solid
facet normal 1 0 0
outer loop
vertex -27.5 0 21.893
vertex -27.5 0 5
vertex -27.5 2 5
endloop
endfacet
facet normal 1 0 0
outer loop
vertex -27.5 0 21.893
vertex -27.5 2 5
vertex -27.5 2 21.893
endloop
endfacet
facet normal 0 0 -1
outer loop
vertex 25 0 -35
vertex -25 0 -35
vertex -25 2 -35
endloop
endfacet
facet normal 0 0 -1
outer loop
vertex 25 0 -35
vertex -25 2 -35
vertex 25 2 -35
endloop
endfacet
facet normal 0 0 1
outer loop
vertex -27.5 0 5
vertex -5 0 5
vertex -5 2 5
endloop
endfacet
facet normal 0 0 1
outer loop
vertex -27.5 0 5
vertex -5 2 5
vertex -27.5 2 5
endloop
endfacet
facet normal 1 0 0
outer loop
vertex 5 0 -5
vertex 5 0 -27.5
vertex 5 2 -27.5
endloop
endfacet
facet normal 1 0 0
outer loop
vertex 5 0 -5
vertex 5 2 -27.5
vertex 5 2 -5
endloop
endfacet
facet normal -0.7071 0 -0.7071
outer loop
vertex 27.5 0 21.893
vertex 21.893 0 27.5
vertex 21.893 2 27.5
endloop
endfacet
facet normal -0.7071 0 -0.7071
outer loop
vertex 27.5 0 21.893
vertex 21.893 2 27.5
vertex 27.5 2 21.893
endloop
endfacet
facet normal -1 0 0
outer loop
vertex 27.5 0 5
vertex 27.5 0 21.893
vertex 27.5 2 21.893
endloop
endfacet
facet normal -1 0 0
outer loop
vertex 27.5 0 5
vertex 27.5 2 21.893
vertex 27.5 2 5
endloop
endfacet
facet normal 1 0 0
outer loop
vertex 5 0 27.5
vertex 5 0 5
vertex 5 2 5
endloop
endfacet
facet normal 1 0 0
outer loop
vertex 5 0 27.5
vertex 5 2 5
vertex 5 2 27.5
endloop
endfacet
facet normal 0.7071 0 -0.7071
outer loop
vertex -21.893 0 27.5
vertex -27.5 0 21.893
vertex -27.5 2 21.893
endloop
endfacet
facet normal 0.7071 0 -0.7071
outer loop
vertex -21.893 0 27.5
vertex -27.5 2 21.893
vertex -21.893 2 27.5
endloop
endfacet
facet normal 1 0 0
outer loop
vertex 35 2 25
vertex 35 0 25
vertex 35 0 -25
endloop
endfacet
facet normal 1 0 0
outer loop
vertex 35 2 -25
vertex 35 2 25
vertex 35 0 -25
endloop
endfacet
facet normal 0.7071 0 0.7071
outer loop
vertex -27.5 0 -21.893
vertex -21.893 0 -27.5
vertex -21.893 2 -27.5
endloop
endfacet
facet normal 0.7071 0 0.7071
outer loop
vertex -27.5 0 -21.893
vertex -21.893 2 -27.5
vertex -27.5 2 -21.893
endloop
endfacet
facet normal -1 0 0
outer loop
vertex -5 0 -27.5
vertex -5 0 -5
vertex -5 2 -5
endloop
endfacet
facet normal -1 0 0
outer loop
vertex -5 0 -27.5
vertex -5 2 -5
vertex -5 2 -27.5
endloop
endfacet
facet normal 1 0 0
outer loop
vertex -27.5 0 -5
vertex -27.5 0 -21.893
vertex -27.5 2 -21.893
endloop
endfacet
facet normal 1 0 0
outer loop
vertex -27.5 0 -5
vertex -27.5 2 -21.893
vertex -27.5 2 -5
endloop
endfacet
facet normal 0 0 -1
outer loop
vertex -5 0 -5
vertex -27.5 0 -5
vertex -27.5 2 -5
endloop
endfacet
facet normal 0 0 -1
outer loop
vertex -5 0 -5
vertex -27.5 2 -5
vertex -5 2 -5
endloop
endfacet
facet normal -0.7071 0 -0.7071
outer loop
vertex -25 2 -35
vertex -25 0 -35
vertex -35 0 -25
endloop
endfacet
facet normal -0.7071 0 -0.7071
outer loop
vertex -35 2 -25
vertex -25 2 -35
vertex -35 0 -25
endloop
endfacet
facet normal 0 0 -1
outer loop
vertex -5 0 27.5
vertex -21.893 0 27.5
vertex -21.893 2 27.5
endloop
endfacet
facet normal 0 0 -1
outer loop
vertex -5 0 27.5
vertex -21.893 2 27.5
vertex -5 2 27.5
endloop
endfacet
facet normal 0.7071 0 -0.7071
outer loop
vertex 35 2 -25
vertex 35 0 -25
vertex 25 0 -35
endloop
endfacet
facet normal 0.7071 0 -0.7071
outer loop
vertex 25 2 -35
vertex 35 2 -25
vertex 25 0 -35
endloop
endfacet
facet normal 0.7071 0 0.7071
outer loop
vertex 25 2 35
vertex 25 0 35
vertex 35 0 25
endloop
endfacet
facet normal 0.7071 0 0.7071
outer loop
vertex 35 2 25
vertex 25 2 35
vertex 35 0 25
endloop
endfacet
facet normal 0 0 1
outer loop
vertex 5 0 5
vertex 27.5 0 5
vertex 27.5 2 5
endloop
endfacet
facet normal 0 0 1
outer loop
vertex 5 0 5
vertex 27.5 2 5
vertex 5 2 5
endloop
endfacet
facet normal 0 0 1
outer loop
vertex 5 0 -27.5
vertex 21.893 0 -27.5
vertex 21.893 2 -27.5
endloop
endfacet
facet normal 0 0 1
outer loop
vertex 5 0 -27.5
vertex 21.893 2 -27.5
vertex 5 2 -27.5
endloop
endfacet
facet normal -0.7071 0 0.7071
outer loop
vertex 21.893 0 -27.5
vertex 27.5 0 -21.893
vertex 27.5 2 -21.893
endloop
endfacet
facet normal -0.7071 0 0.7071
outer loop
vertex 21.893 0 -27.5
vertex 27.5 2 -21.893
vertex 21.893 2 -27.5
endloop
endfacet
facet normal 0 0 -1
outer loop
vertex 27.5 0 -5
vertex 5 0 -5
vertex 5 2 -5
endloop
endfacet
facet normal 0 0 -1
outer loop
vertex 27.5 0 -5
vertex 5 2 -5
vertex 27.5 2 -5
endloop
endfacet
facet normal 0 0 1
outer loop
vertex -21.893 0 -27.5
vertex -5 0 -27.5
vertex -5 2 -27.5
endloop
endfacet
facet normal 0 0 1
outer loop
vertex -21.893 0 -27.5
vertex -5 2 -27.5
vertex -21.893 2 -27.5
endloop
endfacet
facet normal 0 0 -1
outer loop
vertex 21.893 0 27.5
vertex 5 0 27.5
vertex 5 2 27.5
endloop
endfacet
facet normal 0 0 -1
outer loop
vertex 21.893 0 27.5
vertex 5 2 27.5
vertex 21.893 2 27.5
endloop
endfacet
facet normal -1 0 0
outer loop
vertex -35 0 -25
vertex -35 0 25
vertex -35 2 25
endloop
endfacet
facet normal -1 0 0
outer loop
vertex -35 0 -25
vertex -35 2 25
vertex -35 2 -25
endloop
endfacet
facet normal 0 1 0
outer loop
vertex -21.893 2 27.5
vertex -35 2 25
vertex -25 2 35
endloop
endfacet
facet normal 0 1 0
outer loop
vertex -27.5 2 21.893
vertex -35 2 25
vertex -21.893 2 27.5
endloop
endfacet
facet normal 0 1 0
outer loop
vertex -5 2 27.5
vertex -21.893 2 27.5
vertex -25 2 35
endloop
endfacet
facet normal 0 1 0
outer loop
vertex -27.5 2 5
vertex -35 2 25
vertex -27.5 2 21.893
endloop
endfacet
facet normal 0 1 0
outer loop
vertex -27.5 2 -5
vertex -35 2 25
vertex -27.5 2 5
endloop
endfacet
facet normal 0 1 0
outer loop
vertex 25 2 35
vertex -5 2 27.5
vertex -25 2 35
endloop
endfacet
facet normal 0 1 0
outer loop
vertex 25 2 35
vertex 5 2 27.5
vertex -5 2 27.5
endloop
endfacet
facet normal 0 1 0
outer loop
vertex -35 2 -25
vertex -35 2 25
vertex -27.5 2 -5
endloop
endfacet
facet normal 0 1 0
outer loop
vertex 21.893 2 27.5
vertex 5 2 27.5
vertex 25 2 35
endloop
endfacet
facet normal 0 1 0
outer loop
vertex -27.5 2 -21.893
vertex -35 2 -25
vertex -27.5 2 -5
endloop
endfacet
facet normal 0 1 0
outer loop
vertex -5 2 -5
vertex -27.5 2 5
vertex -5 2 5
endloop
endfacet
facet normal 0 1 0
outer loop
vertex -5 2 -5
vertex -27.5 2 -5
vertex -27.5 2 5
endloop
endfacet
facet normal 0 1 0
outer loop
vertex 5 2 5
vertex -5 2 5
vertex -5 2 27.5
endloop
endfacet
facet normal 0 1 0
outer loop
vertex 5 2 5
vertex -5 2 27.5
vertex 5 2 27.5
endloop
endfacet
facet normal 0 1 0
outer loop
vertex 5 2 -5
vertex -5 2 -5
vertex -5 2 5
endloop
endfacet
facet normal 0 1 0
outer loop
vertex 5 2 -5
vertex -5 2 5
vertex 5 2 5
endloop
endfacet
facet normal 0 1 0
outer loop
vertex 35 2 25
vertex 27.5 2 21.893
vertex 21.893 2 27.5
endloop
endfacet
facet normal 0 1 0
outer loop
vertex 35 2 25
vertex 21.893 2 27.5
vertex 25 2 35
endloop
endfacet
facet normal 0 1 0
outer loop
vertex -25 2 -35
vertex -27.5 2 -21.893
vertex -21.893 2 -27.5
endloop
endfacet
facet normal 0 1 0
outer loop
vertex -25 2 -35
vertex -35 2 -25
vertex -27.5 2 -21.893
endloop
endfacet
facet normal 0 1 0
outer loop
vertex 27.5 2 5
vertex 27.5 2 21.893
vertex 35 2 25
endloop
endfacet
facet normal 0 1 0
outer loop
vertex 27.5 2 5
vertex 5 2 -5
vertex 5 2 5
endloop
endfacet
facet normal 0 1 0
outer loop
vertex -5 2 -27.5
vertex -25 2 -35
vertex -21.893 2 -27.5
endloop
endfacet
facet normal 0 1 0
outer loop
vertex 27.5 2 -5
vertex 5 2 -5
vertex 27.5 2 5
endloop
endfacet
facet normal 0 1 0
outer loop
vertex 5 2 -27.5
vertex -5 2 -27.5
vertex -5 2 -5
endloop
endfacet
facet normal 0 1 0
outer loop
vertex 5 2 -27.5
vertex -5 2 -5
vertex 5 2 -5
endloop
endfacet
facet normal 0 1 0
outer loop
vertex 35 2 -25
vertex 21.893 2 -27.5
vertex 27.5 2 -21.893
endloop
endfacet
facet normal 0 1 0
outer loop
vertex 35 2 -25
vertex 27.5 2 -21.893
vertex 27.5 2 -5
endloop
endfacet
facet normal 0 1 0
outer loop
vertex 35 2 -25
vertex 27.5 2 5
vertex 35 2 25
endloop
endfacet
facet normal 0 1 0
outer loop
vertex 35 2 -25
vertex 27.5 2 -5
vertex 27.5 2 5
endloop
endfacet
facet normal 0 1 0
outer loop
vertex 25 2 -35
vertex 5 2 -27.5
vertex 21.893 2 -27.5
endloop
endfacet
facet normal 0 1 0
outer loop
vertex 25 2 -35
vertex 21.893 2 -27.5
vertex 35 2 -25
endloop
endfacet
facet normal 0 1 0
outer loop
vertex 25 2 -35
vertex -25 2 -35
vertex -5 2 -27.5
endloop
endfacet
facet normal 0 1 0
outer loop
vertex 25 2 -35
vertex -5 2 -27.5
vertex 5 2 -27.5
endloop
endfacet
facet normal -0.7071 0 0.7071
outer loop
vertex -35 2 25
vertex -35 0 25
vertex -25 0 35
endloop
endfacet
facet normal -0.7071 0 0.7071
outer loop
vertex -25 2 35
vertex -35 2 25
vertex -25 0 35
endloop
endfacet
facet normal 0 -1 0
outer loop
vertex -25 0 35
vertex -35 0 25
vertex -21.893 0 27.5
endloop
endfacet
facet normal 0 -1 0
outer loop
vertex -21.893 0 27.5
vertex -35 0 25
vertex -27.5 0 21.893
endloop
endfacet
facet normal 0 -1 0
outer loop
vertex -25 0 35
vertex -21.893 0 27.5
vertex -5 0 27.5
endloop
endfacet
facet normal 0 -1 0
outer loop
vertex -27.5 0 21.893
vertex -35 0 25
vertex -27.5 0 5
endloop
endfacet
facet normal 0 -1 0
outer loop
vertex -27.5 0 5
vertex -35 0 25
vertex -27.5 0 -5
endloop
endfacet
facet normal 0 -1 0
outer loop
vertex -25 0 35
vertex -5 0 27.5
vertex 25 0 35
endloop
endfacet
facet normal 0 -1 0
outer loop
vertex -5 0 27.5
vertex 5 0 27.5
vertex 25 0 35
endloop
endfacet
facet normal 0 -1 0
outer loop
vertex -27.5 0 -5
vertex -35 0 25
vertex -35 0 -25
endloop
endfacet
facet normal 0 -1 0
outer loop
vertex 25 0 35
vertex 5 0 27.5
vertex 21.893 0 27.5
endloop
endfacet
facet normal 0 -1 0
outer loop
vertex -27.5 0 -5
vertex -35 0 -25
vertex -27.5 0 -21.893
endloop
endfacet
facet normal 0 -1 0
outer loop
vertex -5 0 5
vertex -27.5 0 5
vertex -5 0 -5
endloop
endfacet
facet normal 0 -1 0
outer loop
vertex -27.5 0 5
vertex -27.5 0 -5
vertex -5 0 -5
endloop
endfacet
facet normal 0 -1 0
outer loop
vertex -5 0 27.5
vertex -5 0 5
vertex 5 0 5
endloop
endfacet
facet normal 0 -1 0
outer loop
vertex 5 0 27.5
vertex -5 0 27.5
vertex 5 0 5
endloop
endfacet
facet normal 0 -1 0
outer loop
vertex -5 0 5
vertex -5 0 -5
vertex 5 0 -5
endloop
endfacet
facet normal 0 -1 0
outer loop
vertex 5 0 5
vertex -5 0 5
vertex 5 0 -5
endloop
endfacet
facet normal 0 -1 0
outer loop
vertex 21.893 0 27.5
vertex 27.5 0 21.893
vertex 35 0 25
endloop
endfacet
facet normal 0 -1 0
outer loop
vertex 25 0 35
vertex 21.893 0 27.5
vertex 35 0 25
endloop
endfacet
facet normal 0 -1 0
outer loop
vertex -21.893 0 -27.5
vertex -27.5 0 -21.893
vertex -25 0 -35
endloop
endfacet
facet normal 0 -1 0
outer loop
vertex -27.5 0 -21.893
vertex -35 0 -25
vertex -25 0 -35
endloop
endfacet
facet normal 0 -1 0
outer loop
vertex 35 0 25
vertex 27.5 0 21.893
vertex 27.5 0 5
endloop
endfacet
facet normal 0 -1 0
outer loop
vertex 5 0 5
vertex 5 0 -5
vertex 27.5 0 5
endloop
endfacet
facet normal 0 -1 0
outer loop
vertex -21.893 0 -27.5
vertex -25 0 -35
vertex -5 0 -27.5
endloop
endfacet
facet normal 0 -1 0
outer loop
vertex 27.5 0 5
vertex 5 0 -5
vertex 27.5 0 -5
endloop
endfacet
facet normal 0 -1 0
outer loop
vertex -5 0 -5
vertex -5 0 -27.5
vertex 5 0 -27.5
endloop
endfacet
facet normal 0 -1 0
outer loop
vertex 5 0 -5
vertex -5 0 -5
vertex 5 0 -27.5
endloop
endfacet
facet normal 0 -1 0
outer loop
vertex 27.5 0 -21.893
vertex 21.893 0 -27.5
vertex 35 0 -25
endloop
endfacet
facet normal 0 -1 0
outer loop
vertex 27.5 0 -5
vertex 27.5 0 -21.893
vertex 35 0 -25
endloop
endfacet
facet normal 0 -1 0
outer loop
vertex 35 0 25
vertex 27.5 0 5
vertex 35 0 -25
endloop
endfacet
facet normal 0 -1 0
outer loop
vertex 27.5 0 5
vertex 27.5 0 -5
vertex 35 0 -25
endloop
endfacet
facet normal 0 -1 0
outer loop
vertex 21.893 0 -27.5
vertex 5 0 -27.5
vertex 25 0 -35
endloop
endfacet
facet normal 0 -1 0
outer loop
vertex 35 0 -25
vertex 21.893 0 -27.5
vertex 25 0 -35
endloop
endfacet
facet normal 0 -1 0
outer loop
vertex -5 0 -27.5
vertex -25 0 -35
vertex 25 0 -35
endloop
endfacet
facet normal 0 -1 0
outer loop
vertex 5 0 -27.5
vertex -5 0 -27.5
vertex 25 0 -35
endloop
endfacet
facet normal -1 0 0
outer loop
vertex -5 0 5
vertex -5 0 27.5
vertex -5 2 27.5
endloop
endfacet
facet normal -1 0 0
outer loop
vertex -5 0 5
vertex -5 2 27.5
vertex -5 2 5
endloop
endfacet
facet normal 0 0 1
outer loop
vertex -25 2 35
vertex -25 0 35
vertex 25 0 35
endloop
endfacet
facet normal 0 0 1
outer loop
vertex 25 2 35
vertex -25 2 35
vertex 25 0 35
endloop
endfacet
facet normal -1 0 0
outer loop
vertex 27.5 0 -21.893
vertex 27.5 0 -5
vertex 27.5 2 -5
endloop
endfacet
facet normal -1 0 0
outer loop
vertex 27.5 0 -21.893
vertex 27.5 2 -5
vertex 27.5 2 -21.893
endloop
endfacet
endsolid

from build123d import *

# Parameters (mm, degrees)
SKETCH2_W           = 70
SKETCH2_H           = 70
BOSS_EXTRUDE1_DEPTH = 2
CUT_EXTRUDE1_DEPTH  = 2
CIRPATTERN1_COUNT   = 4


with BuildPart() as part:
    # Sketch2 → Boss-Extrude1 (new body)
    with BuildSketch(Plane(origin=(0, 0, 0), x_dir=(1, 0, 0), z_dir=(0, 1, 0))):
        Rectangle(SKETCH2_W, SKETCH2_H)
    extrude(amount=BOSS_EXTRUDE1_DEPTH)

    # Sketch4 → Cut-Extrude1 (cut)
    with BuildSketch(Plane.XZ):
        Polygon((25, 35), (35, 25), (35, 35), align=None)
        Polygon((21.893398282, 27.5), (27.5, 21.893398282), (27.5, 5), (5, 5), (5, 27.5), align=None)
    cut_extrude1 = extrude(amount=-CUT_EXTRUDE1_DEPTH, mode=Mode.SUBTRACT)

    # CirPattern1: Cut-Extrude1 ×4 about axis
    cirpattern1_axis = Axis((0, 0, 0), (0, 1, 0))
    for i in range(1, CIRPATTERN1_COUNT):
        add(cut_extrude1.rotate(cirpattern1_axis, i * 360 / CIRPATTERN1_COUNT), mode=Mode.SUBTRACT)


solid = part.part
